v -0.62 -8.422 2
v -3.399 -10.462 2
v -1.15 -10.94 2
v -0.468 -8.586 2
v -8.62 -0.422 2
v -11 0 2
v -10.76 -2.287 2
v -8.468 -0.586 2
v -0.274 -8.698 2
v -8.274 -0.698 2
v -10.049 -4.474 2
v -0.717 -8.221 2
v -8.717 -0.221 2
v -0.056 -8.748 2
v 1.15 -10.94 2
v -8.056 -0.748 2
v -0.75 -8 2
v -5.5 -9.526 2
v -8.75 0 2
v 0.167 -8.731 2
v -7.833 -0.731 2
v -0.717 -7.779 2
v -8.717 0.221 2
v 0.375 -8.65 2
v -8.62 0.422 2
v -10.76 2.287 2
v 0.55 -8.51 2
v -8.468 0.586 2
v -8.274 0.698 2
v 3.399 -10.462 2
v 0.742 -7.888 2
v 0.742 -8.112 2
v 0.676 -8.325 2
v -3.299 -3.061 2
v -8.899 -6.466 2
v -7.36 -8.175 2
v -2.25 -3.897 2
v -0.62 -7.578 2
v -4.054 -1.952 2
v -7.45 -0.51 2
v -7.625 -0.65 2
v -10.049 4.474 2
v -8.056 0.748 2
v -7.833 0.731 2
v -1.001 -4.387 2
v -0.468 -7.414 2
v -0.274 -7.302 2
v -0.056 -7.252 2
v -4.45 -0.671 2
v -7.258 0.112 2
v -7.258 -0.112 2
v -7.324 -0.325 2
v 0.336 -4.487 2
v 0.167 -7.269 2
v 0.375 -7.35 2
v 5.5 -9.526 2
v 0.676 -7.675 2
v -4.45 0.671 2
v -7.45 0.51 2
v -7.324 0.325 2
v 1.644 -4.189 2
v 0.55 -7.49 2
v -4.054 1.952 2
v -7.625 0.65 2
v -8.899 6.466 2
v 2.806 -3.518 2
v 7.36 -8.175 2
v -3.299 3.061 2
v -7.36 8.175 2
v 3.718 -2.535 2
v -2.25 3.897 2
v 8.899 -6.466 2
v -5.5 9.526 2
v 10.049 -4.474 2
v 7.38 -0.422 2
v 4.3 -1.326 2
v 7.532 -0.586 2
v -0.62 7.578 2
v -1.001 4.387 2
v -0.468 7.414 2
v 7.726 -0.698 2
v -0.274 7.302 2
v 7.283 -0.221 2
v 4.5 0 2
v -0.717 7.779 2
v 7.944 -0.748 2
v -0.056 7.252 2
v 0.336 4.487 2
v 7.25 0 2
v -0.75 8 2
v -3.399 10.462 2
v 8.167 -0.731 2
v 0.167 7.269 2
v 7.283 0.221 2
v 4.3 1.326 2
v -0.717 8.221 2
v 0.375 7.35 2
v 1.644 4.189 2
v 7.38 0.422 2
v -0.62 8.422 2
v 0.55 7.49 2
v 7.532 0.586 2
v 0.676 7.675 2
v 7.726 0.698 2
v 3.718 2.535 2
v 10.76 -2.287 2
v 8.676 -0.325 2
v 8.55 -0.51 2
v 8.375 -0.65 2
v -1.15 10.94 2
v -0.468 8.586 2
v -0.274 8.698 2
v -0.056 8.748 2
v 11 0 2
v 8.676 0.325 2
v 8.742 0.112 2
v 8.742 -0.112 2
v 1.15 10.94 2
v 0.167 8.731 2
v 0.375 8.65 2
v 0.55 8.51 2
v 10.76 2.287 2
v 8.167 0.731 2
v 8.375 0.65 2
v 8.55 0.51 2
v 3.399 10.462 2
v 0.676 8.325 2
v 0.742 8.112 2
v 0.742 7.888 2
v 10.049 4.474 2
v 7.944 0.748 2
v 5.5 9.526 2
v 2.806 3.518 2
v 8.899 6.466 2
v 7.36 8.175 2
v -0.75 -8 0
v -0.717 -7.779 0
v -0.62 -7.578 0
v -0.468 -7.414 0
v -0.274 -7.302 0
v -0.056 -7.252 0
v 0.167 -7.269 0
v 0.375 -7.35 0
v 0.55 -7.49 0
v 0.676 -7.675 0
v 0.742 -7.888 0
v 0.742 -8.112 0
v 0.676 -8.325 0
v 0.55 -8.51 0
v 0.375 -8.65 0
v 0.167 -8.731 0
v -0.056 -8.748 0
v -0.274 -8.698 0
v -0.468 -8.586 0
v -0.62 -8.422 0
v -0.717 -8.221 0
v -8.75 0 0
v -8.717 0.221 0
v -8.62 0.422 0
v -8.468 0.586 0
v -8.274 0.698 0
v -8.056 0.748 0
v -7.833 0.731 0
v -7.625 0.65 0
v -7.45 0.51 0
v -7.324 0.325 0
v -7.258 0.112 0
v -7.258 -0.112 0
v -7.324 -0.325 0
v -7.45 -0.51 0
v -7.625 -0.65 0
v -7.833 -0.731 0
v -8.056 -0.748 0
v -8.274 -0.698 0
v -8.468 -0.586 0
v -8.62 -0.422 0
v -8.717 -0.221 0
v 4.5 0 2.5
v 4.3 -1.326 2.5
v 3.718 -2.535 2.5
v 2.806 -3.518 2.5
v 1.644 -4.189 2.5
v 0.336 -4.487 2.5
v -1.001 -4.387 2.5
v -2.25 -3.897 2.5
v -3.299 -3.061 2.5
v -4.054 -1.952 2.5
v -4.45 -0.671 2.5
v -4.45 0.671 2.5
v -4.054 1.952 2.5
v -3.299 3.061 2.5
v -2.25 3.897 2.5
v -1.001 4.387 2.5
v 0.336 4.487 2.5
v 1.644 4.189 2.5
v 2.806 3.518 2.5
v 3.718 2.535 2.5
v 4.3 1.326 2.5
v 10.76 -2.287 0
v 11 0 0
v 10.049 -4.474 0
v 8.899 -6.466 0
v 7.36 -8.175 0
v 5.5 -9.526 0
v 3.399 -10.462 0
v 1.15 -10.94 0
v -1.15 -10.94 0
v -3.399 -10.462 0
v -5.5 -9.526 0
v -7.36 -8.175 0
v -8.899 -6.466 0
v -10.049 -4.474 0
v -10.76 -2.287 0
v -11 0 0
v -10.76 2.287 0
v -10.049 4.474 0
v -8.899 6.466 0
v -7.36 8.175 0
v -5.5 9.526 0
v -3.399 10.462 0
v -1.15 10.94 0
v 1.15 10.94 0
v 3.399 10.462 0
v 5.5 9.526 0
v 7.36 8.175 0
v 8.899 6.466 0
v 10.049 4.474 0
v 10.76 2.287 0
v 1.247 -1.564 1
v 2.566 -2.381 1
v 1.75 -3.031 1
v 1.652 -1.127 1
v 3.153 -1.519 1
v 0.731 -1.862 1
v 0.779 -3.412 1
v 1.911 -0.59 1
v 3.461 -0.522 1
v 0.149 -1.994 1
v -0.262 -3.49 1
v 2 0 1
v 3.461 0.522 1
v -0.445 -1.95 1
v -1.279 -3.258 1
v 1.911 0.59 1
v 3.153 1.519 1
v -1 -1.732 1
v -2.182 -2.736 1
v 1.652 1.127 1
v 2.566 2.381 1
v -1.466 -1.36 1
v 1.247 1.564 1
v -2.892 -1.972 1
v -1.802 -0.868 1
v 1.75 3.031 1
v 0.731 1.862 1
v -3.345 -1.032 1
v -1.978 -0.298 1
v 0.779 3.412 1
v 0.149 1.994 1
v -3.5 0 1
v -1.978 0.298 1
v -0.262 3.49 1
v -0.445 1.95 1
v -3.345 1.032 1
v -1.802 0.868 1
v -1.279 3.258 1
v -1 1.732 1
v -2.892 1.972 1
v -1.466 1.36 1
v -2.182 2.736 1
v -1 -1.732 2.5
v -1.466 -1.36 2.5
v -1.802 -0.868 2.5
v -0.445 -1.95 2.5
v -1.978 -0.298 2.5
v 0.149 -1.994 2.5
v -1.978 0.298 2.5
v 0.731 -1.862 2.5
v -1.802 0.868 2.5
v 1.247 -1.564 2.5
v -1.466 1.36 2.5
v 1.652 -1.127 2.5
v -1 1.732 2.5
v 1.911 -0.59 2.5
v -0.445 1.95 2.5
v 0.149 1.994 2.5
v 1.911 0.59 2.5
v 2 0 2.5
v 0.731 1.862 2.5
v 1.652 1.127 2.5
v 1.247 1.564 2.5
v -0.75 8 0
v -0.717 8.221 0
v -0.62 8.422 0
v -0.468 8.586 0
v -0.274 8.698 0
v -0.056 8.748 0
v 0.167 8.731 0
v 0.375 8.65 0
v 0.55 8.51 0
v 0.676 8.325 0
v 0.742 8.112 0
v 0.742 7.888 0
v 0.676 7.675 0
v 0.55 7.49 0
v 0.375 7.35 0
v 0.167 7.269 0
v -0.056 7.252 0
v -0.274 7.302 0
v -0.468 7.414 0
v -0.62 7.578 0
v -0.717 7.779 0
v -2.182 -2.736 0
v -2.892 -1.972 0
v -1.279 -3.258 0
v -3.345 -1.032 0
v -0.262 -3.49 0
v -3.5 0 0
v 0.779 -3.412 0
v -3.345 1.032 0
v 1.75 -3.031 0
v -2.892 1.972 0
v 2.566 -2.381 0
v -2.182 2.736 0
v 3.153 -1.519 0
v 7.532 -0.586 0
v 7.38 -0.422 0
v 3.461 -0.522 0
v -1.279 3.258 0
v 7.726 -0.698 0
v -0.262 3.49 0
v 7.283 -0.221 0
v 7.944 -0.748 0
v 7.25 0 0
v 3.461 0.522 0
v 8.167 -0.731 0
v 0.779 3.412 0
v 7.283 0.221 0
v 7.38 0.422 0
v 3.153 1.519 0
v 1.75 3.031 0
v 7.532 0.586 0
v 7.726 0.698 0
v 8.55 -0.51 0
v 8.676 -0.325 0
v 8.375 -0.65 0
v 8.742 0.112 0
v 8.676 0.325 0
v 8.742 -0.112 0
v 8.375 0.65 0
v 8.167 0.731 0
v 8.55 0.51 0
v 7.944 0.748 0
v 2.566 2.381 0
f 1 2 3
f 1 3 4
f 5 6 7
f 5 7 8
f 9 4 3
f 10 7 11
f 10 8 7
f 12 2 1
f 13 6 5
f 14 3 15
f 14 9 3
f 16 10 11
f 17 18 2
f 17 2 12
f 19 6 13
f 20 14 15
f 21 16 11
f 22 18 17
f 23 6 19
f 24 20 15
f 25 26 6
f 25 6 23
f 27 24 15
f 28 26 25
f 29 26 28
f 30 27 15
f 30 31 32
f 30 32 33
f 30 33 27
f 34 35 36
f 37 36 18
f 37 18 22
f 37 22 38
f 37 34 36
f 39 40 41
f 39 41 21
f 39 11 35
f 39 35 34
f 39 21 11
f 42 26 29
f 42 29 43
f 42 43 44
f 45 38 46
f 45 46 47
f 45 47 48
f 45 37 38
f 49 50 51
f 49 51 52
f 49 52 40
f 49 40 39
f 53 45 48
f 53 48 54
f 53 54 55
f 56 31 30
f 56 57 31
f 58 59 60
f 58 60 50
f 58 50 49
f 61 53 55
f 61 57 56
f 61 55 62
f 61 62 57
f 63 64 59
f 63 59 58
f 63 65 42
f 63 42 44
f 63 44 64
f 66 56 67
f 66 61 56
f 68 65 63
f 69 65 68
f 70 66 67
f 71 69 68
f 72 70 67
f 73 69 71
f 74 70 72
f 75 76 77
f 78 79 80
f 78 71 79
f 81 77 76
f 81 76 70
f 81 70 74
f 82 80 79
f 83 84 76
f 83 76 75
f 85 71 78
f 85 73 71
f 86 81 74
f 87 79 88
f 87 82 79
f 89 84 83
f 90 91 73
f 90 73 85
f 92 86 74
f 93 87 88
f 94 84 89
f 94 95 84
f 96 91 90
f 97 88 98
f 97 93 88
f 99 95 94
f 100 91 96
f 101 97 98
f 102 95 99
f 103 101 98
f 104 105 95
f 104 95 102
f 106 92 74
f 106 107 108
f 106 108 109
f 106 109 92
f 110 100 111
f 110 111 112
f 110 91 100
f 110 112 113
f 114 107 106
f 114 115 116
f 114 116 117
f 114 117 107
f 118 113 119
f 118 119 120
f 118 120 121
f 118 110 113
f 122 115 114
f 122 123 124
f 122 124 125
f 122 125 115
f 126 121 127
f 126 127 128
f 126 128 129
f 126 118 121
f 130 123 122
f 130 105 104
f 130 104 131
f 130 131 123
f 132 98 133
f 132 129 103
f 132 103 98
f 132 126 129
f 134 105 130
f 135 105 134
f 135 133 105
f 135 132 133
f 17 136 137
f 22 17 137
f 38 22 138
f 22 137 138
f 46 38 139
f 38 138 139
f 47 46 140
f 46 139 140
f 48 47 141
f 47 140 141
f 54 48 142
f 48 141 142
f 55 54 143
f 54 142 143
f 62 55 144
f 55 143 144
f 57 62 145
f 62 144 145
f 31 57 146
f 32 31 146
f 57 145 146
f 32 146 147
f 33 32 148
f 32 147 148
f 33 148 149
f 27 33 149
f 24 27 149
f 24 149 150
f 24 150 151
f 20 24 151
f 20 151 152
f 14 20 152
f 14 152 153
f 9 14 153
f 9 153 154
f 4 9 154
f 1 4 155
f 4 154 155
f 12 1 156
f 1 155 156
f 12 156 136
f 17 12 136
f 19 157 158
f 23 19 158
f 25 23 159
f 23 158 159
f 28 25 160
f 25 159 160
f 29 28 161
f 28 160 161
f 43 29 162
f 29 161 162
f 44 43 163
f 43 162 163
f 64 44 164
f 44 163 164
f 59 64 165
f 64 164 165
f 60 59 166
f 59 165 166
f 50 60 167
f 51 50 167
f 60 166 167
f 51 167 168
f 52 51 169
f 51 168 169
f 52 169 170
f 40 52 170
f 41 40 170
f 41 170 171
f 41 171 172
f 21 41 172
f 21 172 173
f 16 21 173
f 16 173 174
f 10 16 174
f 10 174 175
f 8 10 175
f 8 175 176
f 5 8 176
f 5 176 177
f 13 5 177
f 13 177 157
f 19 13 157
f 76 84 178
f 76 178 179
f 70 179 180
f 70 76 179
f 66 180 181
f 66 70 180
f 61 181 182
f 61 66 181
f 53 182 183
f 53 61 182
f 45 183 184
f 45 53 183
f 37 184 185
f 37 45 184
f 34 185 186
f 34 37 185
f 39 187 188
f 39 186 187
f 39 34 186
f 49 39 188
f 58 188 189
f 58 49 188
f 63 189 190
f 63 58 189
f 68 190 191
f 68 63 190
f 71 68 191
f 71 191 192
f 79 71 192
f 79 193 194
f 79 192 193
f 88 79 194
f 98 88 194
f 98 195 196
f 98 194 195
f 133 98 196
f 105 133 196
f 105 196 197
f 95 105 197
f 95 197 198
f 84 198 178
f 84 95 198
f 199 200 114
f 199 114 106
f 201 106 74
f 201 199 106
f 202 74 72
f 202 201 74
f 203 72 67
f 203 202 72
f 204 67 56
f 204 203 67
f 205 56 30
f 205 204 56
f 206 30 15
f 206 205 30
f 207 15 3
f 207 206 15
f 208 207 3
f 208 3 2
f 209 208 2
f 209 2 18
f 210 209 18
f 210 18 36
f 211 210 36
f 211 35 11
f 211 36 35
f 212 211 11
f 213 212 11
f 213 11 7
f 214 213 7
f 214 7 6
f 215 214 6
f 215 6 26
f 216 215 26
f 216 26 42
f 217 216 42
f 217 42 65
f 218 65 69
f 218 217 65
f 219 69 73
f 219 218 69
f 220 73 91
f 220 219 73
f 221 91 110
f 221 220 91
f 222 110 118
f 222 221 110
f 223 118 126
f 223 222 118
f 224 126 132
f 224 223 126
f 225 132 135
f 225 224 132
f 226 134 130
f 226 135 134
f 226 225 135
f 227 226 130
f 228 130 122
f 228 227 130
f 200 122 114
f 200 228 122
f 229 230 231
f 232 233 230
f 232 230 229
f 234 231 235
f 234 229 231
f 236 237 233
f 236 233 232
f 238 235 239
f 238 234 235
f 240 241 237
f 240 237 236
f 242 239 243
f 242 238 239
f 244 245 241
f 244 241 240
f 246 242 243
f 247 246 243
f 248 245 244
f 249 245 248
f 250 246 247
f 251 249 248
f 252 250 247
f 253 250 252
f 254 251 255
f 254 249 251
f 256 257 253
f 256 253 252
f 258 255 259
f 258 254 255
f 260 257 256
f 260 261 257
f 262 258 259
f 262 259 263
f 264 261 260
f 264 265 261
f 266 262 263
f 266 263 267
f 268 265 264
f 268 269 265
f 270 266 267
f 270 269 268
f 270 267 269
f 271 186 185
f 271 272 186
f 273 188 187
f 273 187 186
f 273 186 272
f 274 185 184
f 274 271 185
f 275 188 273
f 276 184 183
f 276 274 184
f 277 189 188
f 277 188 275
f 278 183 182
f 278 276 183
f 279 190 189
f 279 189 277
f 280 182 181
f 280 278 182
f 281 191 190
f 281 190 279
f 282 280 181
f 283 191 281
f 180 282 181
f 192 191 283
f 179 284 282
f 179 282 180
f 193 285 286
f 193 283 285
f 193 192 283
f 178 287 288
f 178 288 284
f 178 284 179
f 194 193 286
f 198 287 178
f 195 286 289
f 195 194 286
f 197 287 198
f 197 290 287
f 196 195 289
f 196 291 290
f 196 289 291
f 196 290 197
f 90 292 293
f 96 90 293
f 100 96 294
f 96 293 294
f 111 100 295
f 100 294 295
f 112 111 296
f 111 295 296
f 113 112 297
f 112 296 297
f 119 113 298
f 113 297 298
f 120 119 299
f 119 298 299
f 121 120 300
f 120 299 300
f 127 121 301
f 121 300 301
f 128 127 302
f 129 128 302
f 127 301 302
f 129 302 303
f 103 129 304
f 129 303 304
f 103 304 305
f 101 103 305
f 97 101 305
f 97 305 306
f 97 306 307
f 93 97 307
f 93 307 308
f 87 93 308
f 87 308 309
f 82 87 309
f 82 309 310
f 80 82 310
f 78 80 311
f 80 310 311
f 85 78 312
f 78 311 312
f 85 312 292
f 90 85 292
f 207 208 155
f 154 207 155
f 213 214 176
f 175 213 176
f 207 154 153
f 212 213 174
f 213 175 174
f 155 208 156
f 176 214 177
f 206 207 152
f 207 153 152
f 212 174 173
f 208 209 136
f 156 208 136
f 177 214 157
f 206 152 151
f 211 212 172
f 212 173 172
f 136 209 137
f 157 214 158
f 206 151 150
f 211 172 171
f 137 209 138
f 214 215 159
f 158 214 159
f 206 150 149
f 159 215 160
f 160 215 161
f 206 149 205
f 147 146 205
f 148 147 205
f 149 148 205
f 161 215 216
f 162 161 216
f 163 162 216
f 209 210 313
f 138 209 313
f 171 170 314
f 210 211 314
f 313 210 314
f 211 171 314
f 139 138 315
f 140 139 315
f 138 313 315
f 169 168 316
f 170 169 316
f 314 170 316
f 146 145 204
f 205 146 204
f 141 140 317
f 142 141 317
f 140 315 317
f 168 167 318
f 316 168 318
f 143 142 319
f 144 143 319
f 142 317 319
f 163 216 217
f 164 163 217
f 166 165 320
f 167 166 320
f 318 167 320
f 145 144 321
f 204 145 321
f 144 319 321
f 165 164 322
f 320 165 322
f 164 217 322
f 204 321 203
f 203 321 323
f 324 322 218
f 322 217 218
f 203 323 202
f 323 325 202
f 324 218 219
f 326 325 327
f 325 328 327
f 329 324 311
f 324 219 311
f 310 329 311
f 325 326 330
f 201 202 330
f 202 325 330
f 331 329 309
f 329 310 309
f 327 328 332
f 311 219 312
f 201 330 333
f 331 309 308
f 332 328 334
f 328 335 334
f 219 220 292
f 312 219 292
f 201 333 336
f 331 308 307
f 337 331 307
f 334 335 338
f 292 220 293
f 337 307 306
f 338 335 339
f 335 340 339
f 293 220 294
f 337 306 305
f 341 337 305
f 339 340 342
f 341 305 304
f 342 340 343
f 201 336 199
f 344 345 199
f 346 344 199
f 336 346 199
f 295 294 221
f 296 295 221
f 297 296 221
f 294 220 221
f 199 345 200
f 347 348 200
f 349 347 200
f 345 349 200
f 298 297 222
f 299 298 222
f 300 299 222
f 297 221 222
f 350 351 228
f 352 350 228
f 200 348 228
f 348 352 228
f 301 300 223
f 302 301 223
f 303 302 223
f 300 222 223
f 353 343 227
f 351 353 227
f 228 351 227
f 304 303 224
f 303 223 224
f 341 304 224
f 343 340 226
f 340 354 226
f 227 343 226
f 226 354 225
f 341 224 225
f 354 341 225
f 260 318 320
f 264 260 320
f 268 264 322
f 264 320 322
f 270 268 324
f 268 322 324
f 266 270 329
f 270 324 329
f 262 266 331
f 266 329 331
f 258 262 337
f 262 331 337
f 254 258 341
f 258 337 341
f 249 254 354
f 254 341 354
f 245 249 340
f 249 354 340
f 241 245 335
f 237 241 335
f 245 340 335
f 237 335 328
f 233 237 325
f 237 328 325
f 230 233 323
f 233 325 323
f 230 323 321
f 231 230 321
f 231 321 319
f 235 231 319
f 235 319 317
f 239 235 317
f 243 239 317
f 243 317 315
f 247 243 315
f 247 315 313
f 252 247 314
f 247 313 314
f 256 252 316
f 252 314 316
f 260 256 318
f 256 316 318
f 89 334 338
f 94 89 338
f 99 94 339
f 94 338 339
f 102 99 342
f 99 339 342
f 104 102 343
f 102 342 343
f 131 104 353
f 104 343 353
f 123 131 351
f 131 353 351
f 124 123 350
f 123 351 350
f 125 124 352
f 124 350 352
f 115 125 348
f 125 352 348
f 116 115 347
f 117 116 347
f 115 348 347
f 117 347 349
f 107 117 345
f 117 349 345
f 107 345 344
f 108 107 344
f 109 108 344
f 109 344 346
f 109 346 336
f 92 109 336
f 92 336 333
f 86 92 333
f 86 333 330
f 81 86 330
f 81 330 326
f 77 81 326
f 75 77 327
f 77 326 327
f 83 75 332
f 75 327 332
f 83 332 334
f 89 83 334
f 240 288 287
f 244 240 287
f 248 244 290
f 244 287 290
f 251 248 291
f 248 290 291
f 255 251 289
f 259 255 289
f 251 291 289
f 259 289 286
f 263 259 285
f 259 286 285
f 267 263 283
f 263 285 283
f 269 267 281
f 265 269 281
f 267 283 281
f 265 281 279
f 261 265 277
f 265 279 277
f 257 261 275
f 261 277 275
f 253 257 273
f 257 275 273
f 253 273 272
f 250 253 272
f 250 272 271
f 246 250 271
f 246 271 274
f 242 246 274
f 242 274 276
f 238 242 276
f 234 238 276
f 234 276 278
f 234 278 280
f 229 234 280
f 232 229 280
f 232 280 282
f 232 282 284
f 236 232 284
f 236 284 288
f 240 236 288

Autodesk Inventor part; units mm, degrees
ref_plane "YZ Plane" through (0, 0, 0) normal (1, 0, 0) x (0, 1, 0)
ref_plane "XZ Plane" through (0, 0, 0) normal (0, 1, 0) x (-1, 0, 0)
ref_plane "XY Plane" through (0, 0, 0) normal (0, 0, 1) x (1, 0, 0)
sketch "Sketch1" plane through (0, 0, 0) normal (0, 0, 1) x (1, 0, 0)
  circle A0 centre (0, 0) radius 11
  dimension "d0" = 22
extrude "Extrusion1" add sketch "Sketch1" along normal blind 2
sketch "Sketch2" plane through (0, 0, 2) normal (0, 0, 1) x (1, 0, 0)
  circle A0 centre (0, 0) radius 4.5
  dimension "d3" = 9
extrude "Extrusion2" add sketch "Sketch2" along normal blind 0.5
sketch "Sketch3" plane through (0, 0, 2.5) normal (0, 0, 1) x (1, 0, 0)
  circle A0 centre (0, 0) radius 2
  dimension "d6" = 4
extrude "Extrusion3" cut sketch "Sketch3" against normal blind 555
sketch "Sketch4" plane through (0, 0, 0) normal (0, 0, -1) x (-1, 0, 0)
  circle A0 centre (0, 0) radius 3.5
  dimension "d9" = 7
extrude "Extrusion4" cut sketch "Sketch4" against normal blind 1
sketch "Sketch5" plane through (0, 0, 0) normal (0, 0, -1) x (-1, 0, 0)
  circle A0 centre (0, -8) radius 0.75
  circle A1 centre (8, 0) radius 0.75
  circle A2 centre (0, 8) radius 0.75
  circle A3 centre (-8, 0) radius 0.75
extrude "Extrusion5" cut sketch "Sketch5" against normal blind 44
properties part number "B11" material "ABS Plastic"
